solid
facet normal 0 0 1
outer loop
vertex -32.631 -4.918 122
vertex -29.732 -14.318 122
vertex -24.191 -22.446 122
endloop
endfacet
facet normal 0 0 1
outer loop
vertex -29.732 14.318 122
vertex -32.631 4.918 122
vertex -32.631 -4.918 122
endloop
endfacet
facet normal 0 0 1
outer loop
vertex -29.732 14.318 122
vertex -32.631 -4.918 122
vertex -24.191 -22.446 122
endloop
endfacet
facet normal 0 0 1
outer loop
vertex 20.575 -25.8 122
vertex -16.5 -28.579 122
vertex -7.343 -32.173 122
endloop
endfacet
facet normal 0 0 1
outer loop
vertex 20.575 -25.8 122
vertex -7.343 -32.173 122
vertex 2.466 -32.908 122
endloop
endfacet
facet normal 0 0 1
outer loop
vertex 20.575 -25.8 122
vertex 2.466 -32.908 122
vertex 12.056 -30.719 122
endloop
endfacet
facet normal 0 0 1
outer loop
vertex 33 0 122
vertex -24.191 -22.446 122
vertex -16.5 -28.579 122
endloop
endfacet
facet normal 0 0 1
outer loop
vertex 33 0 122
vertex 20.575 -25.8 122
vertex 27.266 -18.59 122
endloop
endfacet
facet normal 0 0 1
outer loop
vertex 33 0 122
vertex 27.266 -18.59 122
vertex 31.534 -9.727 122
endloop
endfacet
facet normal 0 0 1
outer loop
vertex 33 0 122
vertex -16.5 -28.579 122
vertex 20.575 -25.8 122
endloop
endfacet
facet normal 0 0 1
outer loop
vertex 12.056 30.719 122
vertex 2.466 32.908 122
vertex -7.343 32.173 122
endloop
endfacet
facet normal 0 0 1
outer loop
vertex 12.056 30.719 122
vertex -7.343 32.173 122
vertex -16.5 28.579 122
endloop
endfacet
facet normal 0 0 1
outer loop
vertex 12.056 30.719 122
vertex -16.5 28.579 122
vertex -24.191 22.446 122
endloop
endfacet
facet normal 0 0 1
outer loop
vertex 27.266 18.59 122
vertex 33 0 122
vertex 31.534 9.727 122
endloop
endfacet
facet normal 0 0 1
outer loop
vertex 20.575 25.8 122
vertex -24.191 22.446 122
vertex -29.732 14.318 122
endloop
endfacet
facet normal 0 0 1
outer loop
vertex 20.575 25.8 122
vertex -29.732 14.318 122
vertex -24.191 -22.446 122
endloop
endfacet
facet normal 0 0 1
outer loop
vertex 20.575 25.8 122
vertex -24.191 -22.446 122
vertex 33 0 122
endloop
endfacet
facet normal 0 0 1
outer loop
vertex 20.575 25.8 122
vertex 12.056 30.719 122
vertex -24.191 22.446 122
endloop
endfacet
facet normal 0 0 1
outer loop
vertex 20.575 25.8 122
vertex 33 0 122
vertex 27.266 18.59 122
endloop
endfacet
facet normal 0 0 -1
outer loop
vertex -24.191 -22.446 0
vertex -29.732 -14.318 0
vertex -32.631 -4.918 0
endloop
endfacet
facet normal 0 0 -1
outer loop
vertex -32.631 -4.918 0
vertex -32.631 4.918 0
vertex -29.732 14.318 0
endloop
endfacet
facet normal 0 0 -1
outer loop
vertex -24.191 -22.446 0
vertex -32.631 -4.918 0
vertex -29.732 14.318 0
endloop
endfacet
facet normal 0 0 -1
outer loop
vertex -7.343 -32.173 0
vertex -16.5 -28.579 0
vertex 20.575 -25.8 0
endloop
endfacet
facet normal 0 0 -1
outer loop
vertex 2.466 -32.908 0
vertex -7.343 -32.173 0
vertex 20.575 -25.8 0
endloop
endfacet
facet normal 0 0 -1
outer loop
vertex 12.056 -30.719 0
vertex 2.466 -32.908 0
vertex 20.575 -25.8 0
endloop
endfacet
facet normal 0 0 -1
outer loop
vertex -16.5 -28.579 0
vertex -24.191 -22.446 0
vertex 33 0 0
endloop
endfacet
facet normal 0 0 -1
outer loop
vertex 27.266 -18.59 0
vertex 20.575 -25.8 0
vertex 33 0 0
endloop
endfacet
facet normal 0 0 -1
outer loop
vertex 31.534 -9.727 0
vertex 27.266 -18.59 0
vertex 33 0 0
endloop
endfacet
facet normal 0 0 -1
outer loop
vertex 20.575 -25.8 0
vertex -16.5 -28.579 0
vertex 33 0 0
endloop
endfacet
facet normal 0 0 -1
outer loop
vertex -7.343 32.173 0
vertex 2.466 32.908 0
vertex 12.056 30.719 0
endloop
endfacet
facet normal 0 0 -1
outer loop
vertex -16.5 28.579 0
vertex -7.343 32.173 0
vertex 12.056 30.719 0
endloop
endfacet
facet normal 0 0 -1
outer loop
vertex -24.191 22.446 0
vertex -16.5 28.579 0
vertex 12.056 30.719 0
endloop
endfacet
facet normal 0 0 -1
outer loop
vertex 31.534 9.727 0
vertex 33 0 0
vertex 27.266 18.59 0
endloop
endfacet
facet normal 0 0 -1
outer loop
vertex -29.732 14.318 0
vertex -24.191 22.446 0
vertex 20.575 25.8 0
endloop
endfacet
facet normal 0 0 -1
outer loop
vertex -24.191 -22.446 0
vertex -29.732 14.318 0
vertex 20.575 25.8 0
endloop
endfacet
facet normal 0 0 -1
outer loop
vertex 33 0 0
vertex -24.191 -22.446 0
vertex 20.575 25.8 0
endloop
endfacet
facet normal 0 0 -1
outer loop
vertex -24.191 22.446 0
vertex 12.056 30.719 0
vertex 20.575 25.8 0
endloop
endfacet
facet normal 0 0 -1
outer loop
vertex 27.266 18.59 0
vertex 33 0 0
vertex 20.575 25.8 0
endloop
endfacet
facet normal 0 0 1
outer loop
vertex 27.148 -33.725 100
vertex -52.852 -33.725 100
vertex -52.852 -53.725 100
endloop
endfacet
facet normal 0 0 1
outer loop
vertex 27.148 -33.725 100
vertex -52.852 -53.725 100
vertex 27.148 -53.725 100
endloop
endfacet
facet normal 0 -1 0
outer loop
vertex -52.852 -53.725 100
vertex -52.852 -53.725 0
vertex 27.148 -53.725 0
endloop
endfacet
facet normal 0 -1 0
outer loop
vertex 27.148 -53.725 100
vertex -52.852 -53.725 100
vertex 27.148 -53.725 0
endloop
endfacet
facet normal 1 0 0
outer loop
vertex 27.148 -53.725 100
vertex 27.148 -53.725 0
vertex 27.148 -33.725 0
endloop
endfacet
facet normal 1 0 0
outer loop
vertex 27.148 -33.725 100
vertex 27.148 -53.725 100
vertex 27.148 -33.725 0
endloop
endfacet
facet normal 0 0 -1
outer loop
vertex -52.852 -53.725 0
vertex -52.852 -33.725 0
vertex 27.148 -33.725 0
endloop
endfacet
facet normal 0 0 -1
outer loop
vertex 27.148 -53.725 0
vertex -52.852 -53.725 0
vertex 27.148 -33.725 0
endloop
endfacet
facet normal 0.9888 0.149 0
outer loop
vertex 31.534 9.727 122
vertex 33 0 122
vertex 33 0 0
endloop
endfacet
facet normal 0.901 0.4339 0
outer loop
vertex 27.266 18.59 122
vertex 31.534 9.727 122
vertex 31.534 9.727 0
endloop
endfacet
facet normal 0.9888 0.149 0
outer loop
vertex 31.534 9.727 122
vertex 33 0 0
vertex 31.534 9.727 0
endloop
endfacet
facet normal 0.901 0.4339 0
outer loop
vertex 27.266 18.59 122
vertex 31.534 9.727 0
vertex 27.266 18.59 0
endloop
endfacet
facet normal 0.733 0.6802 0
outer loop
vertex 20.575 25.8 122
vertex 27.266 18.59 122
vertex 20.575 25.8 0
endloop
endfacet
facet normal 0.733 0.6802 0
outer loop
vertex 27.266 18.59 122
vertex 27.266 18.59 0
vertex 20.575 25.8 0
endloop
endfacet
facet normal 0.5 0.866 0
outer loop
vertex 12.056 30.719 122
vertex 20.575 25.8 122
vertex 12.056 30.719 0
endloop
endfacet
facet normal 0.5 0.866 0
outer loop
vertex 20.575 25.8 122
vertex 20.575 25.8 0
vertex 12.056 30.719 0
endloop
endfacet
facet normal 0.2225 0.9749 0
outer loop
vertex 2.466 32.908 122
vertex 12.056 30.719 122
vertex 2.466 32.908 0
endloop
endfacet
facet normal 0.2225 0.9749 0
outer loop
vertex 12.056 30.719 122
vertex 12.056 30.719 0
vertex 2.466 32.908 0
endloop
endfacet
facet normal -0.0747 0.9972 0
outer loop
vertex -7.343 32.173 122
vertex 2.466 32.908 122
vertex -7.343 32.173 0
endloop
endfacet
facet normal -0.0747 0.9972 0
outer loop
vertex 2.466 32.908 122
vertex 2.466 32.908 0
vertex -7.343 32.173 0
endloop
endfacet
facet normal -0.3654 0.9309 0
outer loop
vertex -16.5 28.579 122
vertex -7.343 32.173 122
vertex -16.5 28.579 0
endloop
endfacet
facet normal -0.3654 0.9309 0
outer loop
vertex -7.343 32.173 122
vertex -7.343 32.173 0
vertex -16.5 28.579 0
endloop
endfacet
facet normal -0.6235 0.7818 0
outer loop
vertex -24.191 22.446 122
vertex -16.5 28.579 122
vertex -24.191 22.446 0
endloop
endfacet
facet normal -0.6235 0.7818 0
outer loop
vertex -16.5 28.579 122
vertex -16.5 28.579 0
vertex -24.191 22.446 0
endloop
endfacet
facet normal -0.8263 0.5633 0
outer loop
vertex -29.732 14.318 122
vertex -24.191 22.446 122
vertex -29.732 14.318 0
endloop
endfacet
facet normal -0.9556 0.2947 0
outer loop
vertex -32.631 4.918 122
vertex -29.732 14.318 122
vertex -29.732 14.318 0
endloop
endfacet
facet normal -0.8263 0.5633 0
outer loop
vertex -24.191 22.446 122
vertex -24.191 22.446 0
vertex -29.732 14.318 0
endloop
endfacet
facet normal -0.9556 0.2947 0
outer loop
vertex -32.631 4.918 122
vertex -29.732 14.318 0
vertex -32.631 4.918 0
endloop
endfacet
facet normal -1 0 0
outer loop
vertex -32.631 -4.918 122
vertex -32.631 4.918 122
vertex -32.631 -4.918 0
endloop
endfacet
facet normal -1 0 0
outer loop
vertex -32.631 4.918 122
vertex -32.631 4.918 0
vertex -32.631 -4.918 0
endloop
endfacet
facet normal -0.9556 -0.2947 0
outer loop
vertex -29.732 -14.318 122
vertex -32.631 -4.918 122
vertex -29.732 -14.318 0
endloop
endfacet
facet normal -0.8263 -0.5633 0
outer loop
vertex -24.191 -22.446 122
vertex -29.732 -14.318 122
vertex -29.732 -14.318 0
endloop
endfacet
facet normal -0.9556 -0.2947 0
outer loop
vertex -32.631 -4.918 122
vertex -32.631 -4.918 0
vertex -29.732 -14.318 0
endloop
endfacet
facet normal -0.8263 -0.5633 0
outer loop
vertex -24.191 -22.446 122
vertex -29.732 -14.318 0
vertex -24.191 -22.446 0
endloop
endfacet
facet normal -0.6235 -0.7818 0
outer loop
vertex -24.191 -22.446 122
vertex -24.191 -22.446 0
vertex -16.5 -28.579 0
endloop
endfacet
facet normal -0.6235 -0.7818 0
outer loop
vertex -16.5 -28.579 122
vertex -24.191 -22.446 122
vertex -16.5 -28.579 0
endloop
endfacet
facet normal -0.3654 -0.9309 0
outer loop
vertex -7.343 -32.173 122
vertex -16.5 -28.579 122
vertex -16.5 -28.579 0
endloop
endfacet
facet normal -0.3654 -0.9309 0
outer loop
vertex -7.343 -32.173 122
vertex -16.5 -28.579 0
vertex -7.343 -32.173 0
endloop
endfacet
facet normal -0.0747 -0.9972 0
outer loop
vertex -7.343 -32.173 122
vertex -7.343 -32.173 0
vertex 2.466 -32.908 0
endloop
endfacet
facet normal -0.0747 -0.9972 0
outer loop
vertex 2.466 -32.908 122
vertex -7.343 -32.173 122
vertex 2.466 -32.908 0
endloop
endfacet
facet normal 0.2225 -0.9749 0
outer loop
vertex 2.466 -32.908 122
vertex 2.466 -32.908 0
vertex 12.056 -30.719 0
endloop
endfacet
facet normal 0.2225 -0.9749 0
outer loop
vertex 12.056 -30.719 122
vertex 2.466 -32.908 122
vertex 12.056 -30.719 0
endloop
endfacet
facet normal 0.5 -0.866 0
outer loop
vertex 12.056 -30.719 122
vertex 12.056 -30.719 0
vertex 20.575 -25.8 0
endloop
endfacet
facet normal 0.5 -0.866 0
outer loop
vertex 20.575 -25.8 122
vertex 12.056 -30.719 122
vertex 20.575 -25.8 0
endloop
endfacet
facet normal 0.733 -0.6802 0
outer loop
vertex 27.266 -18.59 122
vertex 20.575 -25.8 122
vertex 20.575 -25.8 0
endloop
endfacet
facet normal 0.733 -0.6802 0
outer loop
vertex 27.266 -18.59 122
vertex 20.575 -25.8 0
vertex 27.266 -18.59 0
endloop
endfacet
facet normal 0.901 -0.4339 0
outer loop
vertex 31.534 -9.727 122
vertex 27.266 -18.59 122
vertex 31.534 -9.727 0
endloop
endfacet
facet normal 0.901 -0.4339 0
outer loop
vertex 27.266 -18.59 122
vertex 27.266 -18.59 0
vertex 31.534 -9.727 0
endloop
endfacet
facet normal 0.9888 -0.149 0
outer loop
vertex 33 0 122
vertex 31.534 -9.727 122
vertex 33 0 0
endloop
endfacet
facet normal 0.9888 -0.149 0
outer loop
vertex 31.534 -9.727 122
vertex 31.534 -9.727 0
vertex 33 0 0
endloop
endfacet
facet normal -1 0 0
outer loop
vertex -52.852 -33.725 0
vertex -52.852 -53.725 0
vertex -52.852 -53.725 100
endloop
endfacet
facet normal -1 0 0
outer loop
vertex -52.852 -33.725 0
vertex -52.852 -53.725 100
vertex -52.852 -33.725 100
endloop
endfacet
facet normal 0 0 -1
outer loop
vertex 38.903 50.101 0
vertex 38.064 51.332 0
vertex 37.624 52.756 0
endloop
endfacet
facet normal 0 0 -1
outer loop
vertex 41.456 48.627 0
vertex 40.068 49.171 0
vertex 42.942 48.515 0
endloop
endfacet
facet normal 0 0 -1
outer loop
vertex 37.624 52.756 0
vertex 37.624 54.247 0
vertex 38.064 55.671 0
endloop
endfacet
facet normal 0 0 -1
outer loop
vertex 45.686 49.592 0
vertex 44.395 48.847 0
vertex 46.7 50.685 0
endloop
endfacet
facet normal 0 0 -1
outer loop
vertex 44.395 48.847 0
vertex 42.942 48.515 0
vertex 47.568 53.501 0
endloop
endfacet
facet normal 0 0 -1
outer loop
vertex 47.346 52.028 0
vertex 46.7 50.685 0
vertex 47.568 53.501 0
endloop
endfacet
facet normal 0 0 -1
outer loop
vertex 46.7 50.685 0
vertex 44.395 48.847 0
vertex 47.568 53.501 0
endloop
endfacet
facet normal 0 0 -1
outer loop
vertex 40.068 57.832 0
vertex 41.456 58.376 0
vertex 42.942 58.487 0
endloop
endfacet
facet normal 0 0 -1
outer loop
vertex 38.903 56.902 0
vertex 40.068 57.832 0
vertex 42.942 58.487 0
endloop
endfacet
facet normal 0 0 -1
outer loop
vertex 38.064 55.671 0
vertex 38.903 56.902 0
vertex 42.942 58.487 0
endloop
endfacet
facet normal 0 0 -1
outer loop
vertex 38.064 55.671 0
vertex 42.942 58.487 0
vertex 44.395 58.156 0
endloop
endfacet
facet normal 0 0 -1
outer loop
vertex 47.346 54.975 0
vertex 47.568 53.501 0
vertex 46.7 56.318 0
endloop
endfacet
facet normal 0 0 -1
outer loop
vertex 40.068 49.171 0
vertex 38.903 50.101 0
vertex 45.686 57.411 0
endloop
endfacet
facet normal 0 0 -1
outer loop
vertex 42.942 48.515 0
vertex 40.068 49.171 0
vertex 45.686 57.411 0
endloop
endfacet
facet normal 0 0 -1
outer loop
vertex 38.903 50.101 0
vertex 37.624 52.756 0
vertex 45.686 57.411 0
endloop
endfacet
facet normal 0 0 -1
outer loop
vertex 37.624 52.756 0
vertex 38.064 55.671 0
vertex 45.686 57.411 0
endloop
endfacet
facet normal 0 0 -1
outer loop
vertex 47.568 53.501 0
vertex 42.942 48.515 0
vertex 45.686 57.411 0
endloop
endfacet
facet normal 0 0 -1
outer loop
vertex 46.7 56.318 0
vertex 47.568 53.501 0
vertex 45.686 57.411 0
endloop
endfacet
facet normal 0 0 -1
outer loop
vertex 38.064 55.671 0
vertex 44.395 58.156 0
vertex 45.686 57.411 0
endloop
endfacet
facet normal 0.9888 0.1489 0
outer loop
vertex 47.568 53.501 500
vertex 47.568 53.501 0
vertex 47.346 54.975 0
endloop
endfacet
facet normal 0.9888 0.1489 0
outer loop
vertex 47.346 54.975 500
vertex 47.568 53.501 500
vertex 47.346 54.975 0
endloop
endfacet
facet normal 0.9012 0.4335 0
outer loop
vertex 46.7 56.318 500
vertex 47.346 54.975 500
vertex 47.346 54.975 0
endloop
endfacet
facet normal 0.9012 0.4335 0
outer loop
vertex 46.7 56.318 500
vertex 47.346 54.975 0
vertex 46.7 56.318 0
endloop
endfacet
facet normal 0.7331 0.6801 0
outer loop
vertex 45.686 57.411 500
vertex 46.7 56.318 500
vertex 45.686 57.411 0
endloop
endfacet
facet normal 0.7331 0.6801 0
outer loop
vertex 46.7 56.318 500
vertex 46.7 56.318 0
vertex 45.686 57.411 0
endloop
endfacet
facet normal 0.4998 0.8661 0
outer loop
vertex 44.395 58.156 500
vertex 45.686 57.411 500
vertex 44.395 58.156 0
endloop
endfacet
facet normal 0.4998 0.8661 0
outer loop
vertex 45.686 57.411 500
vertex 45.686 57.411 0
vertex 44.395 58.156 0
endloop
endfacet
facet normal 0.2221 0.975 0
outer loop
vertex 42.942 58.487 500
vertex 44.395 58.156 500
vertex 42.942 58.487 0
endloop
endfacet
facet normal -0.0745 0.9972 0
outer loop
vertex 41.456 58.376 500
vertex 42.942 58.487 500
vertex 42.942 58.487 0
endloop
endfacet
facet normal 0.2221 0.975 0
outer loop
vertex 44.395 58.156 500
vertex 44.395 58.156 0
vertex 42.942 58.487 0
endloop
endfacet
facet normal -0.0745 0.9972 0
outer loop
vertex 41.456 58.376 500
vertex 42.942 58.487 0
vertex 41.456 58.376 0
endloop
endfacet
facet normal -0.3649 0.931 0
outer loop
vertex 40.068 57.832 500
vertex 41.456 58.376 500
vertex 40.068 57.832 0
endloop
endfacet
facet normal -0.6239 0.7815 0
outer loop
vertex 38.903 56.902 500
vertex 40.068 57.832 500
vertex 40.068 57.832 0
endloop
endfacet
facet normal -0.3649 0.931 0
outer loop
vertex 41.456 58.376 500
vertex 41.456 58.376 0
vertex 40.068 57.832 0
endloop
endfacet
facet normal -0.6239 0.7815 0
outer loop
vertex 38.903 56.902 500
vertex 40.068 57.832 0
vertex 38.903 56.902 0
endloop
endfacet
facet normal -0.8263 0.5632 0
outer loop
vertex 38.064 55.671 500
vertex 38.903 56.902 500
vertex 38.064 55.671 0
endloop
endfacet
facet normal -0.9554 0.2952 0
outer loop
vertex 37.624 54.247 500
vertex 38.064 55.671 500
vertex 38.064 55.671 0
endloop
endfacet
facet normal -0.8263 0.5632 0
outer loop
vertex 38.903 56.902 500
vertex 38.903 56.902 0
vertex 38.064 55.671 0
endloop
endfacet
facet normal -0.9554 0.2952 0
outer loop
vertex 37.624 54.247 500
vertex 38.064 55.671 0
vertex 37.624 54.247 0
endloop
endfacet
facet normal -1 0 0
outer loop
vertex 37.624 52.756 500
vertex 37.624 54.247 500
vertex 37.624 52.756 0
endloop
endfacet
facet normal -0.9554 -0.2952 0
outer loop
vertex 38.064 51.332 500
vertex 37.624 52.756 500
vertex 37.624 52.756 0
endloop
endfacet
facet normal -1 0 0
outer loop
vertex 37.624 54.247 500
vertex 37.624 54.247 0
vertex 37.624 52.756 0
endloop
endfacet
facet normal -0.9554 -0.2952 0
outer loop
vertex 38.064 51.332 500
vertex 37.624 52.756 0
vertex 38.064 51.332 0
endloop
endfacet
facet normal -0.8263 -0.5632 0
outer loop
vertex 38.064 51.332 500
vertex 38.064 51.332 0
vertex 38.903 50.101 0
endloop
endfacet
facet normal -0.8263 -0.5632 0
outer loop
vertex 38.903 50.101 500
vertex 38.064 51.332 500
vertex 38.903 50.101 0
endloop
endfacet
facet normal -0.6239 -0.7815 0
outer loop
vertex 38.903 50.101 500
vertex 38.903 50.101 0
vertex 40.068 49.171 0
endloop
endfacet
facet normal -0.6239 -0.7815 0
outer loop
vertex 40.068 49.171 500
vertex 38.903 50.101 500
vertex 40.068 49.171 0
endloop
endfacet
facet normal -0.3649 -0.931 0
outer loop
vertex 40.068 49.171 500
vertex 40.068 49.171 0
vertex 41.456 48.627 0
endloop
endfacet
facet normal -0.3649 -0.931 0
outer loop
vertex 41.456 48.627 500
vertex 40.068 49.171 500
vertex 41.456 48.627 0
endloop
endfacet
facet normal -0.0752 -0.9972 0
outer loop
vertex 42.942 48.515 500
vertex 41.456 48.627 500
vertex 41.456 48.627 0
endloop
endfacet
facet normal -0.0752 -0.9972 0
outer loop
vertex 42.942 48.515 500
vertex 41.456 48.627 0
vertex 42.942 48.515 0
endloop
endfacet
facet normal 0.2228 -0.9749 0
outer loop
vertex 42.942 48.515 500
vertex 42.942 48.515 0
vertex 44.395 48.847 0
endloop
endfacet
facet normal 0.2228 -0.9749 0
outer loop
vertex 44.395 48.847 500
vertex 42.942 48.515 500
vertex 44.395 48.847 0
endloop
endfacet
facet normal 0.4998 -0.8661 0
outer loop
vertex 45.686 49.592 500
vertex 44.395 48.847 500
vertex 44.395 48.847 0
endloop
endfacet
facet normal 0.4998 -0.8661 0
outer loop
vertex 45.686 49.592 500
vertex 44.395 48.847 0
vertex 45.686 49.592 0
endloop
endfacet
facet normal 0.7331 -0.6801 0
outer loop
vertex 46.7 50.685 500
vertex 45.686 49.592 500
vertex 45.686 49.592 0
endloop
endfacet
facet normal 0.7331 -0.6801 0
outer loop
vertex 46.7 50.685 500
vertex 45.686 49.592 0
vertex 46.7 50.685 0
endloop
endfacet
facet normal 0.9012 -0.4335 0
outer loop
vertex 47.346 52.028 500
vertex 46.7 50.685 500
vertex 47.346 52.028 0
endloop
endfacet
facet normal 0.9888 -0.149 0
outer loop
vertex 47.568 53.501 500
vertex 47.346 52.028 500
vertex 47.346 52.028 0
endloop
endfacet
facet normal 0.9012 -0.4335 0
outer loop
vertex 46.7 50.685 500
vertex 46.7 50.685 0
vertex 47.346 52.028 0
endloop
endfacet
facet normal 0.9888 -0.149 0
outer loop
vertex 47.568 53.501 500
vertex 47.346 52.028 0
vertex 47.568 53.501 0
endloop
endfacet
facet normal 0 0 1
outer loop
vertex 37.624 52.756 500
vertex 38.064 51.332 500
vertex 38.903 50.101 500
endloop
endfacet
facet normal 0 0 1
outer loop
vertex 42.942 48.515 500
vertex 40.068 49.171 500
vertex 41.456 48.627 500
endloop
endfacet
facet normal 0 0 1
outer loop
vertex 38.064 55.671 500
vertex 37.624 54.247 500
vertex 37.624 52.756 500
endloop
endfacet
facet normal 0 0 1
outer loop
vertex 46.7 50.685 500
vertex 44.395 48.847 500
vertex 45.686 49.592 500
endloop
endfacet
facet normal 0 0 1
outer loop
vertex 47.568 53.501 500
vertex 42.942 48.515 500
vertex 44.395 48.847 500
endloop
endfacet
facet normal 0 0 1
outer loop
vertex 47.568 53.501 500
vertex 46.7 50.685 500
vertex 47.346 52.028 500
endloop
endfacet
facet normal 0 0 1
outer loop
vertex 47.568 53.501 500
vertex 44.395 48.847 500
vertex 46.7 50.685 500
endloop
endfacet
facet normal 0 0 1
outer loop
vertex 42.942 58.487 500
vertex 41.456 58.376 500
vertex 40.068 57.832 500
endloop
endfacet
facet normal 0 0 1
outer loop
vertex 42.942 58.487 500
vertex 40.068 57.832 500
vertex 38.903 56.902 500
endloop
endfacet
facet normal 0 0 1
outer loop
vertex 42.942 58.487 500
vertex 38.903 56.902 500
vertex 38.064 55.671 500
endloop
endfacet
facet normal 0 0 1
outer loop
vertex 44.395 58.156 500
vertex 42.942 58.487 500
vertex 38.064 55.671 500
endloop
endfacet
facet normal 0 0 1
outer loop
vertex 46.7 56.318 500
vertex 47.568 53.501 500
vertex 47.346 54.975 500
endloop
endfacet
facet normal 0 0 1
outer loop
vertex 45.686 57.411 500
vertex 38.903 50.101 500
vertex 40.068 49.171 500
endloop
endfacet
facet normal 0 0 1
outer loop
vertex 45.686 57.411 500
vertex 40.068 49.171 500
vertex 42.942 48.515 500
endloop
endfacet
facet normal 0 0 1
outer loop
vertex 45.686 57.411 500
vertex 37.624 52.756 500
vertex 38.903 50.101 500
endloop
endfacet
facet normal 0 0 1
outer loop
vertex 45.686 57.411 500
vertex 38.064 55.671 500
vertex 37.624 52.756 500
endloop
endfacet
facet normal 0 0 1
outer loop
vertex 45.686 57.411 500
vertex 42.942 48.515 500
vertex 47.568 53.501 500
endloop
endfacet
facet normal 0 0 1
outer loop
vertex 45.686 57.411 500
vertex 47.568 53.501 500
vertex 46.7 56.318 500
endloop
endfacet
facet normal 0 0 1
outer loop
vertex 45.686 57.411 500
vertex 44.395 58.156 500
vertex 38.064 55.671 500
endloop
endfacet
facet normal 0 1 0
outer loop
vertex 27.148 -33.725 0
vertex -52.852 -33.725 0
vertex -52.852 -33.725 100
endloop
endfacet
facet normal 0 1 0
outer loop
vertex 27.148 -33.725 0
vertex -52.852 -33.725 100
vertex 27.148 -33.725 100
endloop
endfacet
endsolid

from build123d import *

# Parameters (mm, degrees)
F0_R     = 33
F1_DEPTH = 122
F2_R     = 5
F3_DEPTH = 500
F4_W     = 80
F4_H     = 20
F5_DEPTH = 100


with BuildPart() as f1:
    # F0 (on Top) → F1 (new body)
    with BuildSketch(Plane.XY):
        Circle(F0_R)
    extrude(amount=F1_DEPTH)


with BuildPart() as f3:
    # F2 (on Top) → F3 (new body)
    with BuildSketch(Plane.XY):
        with Locations((42.568386, 53.501464)):
            Circle(F2_R)
    extrude(amount=F3_DEPTH)


with BuildPart() as f5:
    # F4 (on Top) → F5 (new body)
    with BuildSketch(Plane.XY):
        with Locations((-12.851629, -43.725265)):
            Rectangle(F4_W, F4_H)
    extrude(amount=F5_DEPTH)


solid = Compound([f1.part, f3.part, f5.part])
